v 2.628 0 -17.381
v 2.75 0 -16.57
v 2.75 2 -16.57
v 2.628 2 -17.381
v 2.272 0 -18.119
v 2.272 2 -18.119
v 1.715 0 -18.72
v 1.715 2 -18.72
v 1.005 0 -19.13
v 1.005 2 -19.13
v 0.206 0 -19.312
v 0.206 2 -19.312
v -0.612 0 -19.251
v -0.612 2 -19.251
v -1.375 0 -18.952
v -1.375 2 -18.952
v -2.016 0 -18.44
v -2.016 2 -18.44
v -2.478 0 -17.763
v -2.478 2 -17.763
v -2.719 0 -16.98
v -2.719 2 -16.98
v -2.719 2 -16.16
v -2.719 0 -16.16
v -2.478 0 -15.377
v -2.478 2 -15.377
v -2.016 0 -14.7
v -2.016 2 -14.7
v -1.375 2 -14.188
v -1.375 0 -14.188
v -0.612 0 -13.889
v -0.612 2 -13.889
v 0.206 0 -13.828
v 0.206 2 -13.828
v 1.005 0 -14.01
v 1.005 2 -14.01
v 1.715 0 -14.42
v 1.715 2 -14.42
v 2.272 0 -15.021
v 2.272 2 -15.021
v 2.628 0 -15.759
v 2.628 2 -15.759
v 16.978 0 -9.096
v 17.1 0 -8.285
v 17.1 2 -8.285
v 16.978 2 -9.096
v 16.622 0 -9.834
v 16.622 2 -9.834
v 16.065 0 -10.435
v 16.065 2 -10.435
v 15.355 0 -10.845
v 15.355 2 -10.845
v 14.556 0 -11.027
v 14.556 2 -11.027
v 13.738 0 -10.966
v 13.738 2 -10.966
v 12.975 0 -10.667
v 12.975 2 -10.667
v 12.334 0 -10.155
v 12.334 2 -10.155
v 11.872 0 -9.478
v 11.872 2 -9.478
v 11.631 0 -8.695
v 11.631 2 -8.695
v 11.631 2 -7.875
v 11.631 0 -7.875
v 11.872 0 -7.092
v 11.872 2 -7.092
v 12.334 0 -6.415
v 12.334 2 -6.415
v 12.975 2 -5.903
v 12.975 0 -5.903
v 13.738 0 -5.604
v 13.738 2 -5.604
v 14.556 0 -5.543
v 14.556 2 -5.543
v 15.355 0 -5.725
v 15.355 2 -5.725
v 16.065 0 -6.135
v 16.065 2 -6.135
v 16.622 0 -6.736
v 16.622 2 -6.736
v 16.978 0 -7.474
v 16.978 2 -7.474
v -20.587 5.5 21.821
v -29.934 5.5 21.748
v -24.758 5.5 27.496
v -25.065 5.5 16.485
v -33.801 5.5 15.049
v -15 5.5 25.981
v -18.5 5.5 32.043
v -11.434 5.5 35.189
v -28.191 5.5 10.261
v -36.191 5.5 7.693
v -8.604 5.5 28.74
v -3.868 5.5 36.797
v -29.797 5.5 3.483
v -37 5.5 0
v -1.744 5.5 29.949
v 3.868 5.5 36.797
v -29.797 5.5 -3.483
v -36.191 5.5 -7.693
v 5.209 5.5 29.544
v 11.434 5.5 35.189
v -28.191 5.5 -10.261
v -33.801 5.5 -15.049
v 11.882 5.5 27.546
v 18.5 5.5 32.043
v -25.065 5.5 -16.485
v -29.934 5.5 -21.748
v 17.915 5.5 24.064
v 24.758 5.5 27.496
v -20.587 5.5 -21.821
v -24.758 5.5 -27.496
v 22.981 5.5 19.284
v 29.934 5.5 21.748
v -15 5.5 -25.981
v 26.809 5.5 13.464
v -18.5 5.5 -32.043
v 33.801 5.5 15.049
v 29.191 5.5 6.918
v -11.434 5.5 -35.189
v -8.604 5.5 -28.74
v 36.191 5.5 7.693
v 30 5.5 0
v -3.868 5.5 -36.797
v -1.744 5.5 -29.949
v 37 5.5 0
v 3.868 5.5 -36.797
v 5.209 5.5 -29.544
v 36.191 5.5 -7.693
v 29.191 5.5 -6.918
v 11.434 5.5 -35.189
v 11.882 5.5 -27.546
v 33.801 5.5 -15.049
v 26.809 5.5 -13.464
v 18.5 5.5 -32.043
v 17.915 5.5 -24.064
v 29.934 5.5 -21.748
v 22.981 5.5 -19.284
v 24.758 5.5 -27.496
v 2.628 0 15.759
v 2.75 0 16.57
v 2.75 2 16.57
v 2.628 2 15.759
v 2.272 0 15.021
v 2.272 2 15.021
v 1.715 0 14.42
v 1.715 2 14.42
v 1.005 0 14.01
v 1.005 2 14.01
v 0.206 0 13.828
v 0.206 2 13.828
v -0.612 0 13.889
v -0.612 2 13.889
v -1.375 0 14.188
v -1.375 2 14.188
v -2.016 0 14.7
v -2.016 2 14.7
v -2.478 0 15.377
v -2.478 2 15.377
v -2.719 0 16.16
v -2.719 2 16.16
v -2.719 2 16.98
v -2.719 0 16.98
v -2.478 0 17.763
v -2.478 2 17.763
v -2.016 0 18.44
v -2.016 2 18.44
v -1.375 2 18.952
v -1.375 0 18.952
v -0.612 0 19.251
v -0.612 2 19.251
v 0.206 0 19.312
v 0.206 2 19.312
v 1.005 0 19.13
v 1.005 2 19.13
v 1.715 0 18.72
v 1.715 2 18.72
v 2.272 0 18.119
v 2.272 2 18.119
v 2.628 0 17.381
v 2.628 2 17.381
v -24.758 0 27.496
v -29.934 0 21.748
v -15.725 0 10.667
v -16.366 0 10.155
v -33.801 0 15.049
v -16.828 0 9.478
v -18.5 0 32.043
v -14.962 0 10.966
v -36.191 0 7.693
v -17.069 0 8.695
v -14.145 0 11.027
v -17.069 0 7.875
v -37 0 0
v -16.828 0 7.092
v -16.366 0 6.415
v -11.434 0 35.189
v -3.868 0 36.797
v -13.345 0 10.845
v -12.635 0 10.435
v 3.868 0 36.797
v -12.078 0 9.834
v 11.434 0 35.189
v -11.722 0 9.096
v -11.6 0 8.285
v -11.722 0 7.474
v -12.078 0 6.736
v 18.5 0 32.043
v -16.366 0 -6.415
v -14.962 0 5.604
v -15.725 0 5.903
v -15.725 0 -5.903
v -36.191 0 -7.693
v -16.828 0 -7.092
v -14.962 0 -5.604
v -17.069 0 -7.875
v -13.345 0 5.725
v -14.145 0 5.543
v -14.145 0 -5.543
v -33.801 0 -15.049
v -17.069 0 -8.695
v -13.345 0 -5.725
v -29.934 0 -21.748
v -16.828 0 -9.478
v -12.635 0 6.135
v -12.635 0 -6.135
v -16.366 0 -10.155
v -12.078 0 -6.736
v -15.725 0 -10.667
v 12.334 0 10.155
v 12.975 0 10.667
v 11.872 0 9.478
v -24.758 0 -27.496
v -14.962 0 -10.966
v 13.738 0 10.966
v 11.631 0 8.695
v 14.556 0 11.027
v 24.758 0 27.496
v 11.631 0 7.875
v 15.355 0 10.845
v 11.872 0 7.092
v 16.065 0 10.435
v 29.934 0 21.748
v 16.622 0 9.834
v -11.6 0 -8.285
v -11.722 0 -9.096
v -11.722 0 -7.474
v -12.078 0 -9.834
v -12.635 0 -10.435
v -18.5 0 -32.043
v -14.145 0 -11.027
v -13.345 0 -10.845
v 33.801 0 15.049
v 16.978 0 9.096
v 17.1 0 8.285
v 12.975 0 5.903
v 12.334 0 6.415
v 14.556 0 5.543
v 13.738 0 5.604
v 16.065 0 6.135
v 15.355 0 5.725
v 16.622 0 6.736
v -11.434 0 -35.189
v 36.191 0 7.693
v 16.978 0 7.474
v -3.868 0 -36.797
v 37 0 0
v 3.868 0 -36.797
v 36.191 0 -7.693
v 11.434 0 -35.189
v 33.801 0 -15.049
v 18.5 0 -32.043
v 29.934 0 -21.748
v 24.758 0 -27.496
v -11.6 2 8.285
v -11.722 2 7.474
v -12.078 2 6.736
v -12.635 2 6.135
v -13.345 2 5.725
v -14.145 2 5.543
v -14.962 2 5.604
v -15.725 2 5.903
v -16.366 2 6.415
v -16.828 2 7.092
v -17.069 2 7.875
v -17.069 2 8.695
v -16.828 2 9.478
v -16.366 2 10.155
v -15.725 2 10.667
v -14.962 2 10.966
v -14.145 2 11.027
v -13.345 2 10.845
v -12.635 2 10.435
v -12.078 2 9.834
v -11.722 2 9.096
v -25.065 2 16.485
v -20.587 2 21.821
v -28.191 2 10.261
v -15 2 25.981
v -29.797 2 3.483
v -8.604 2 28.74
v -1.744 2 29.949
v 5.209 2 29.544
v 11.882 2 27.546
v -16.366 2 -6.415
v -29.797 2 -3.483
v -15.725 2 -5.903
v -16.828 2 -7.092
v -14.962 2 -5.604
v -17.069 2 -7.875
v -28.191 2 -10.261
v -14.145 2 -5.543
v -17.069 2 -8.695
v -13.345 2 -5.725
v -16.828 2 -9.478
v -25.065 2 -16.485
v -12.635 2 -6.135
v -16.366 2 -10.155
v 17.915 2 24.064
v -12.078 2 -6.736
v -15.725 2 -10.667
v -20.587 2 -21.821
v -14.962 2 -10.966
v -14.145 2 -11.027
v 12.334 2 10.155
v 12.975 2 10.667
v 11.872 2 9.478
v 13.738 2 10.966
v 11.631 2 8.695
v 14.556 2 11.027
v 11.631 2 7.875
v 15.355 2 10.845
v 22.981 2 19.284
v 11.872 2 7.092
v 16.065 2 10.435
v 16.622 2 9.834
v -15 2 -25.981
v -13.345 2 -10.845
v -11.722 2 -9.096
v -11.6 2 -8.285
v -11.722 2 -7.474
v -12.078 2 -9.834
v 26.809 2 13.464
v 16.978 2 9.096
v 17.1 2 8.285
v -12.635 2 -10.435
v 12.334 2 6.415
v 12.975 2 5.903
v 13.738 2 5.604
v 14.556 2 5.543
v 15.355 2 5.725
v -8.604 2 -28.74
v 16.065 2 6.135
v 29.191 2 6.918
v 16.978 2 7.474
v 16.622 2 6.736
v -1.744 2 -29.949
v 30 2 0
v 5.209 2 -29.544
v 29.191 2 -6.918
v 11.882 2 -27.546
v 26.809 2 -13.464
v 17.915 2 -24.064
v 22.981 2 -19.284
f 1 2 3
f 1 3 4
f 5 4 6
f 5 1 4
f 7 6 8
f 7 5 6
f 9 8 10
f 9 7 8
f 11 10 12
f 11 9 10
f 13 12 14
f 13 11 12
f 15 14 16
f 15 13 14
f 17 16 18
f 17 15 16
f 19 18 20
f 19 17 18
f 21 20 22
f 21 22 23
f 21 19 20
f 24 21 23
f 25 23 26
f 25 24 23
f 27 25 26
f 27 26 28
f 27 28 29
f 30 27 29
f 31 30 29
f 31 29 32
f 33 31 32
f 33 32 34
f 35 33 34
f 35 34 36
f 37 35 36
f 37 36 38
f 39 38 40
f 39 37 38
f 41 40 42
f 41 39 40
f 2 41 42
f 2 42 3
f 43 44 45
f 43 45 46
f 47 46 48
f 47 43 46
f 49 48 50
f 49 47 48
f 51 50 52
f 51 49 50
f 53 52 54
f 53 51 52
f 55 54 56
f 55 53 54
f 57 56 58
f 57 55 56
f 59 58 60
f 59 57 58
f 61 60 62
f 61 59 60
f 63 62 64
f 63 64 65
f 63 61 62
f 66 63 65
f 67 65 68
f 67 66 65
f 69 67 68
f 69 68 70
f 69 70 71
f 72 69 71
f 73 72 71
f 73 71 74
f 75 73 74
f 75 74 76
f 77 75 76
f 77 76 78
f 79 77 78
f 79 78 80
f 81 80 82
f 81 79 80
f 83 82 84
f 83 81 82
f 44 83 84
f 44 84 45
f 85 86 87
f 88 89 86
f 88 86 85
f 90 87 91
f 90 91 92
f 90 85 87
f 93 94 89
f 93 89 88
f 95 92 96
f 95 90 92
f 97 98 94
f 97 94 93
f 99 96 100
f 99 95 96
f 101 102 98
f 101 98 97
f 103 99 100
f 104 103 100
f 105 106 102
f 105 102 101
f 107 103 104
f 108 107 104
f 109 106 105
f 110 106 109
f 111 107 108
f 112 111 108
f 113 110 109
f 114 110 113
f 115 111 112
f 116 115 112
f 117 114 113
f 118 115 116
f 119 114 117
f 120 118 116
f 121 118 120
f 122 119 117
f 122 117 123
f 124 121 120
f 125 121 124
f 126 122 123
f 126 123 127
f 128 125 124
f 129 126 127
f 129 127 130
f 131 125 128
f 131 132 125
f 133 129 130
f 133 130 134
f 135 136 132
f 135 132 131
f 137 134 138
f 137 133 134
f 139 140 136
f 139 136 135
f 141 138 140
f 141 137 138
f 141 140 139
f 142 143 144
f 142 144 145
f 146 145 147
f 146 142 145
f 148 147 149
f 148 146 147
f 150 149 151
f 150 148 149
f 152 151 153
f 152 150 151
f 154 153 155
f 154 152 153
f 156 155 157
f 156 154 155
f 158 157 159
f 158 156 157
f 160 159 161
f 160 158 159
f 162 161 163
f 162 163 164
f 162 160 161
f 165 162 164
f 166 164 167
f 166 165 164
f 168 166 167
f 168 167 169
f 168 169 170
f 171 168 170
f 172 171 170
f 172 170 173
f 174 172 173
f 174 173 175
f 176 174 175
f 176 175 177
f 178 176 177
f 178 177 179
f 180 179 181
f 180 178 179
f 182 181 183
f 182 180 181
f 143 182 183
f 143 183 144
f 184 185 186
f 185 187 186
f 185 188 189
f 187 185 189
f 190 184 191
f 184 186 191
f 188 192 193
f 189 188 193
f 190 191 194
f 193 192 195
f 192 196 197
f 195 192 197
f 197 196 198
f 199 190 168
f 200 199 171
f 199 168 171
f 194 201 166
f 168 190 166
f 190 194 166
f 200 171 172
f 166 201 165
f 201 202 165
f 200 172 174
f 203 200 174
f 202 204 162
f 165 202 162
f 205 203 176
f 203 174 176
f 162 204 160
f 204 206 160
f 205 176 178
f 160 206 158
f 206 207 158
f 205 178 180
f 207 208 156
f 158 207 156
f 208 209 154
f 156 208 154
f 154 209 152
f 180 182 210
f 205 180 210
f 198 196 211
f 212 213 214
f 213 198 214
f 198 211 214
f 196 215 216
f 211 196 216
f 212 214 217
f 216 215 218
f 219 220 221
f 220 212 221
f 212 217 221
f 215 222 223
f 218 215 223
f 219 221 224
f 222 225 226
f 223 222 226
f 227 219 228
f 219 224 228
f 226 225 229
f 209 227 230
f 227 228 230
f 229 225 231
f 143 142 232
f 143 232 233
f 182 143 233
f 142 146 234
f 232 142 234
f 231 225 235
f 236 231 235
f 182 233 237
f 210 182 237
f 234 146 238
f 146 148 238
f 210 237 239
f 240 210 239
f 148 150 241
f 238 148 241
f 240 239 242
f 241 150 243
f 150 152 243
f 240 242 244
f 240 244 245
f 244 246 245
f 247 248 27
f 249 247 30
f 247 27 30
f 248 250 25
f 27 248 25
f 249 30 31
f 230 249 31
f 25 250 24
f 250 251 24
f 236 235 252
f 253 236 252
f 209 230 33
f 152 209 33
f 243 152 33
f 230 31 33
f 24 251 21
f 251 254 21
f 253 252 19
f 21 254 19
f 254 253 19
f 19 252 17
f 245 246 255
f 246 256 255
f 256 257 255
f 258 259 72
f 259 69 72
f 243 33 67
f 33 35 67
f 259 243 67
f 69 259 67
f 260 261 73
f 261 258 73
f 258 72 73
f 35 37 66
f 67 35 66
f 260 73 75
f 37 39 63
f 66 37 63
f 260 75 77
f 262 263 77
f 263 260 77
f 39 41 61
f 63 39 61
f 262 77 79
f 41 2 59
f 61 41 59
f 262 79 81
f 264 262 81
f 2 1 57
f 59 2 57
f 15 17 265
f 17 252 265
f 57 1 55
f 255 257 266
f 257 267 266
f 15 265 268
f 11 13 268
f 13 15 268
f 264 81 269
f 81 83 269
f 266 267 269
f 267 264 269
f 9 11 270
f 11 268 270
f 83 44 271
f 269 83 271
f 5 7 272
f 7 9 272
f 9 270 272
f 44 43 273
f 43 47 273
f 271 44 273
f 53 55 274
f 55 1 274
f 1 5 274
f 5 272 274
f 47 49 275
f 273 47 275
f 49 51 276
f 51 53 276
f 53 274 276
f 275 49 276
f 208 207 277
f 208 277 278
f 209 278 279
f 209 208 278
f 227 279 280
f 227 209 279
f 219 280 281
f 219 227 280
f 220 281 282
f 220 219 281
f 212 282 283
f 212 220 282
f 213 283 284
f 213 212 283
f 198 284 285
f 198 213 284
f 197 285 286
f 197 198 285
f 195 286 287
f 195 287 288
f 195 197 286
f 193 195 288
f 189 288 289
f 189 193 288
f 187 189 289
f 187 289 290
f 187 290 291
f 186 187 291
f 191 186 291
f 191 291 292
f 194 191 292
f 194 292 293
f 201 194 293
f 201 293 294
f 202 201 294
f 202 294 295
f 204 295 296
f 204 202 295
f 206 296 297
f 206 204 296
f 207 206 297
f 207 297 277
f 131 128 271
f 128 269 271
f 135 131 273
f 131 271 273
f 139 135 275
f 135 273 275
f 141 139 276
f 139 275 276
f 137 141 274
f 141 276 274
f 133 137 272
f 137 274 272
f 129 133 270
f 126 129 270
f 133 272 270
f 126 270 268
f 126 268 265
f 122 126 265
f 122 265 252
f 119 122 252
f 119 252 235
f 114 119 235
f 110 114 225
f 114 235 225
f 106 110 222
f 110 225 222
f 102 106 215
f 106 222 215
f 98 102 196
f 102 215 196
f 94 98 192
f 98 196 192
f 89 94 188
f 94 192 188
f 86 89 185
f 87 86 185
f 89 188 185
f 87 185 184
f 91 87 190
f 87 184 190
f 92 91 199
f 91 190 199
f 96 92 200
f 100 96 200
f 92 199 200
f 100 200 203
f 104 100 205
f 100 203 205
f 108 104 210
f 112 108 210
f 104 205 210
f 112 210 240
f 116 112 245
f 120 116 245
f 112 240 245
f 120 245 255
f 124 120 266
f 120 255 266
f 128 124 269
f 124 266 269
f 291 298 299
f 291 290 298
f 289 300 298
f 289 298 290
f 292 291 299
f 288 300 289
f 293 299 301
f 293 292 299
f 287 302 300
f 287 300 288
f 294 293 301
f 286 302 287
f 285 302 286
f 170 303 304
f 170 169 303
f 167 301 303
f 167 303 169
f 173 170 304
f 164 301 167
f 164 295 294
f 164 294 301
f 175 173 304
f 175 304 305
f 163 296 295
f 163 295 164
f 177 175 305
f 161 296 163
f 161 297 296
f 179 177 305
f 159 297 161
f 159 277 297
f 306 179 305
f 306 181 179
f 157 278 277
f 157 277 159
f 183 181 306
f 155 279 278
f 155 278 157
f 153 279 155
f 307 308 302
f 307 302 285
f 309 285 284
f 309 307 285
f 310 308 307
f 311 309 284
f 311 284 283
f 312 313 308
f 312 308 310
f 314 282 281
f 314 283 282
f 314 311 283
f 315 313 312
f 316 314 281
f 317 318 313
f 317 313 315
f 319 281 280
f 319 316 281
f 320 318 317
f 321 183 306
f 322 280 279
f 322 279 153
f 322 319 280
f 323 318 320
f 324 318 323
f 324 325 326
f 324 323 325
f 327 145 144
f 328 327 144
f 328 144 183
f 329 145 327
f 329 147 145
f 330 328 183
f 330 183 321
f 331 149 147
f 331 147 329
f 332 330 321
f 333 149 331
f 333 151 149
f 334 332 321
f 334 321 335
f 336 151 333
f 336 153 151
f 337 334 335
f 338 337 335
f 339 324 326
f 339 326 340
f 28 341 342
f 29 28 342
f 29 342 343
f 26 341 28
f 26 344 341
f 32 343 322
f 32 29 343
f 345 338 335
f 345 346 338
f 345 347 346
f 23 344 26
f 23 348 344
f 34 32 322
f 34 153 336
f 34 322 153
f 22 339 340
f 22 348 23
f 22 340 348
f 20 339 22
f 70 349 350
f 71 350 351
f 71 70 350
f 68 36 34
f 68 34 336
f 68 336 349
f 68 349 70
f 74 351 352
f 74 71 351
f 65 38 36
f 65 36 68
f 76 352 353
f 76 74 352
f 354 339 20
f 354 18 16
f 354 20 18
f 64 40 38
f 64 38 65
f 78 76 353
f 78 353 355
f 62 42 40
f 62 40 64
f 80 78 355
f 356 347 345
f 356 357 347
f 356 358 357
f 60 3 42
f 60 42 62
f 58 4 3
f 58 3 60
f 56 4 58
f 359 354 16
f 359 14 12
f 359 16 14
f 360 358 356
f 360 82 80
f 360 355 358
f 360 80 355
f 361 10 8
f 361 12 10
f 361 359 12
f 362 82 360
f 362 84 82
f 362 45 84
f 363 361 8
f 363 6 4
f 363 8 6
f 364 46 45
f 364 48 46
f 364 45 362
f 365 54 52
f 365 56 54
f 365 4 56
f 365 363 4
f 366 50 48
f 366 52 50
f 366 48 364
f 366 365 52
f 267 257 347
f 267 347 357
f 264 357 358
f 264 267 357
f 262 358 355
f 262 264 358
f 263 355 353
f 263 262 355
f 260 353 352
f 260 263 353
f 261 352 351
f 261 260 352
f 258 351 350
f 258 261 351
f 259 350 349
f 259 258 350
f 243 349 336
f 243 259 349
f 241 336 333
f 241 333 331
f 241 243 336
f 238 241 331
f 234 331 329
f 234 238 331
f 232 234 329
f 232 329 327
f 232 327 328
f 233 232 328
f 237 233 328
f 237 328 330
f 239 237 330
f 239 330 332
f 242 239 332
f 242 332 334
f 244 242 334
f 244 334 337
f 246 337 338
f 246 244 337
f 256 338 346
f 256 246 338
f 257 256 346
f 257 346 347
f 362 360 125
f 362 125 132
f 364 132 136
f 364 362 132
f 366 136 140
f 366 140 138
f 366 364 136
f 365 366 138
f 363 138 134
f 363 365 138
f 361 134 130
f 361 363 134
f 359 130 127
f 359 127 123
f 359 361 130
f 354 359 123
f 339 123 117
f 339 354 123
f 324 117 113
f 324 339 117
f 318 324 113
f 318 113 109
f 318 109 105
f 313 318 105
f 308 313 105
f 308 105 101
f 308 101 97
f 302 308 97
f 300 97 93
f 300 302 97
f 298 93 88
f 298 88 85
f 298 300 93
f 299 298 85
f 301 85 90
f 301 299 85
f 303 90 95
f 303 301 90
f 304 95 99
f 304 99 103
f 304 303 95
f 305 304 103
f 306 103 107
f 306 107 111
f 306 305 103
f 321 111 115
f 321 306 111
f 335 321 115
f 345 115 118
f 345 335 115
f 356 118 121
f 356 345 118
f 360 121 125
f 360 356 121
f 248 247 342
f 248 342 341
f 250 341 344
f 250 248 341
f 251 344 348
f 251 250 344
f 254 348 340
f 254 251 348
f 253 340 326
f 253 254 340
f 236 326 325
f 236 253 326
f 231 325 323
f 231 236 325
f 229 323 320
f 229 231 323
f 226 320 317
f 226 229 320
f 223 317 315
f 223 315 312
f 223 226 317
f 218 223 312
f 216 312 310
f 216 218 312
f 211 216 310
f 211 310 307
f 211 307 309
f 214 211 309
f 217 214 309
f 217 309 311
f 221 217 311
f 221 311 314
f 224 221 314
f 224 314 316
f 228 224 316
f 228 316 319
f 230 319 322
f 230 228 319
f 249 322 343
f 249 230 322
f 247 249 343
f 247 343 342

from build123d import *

# Parameters (mm, degrees)
SKETCH1_R           = 37
SKETCH1_R_2         = 2.75
BOSS_EXTRUDE1_DEPTH = 2
SKETCH2_R           = 37
SKETCH2_R_2         = 30
BOSS_EXTRUDE2_DEPTH = 3.5


with BuildPart() as part:
    # Sketch1 → Boss-Extrude1 (new body)
    with BuildSketch(Plane(origin=(0, 0, 0), x_dir=(1, 0, 0), z_dir=(0, 1, 0))):
        Circle(SKETCH1_R)
        with Locations((0, 16.57)):
            Circle(SKETCH1_R_2, mode=Mode.SUBTRACT)
        with Locations((-14.350040941, 8.285)):
            Circle(SKETCH1_R_2, mode=Mode.SUBTRACT)
        with Locations((-14.350040941, -8.285)):
            Circle(SKETCH1_R_2, mode=Mode.SUBTRACT)
        with Locations((0, -16.57)):
            Circle(SKETCH1_R_2, mode=Mode.SUBTRACT)
        with Locations((14.350040941, -8.285)):
            Circle(SKETCH1_R_2, mode=Mode.SUBTRACT)
        with Locations((14.350040941, 8.285)):
            Circle(SKETCH1_R_2, mode=Mode.SUBTRACT)
    extrude(amount=BOSS_EXTRUDE1_DEPTH)

    # Sketch2 → Boss-Extrude2 (add)
    with BuildSketch(Plane(origin=(0, 2, 0), x_dir=(1, 0, 0), z_dir=(0, 1, 0))):
        Circle(SKETCH2_R)
        Circle(SKETCH2_R_2, mode=Mode.SUBTRACT)
    extrude(amount=BOSS_EXTRUDE2_DEPTH)


solid = part.part
